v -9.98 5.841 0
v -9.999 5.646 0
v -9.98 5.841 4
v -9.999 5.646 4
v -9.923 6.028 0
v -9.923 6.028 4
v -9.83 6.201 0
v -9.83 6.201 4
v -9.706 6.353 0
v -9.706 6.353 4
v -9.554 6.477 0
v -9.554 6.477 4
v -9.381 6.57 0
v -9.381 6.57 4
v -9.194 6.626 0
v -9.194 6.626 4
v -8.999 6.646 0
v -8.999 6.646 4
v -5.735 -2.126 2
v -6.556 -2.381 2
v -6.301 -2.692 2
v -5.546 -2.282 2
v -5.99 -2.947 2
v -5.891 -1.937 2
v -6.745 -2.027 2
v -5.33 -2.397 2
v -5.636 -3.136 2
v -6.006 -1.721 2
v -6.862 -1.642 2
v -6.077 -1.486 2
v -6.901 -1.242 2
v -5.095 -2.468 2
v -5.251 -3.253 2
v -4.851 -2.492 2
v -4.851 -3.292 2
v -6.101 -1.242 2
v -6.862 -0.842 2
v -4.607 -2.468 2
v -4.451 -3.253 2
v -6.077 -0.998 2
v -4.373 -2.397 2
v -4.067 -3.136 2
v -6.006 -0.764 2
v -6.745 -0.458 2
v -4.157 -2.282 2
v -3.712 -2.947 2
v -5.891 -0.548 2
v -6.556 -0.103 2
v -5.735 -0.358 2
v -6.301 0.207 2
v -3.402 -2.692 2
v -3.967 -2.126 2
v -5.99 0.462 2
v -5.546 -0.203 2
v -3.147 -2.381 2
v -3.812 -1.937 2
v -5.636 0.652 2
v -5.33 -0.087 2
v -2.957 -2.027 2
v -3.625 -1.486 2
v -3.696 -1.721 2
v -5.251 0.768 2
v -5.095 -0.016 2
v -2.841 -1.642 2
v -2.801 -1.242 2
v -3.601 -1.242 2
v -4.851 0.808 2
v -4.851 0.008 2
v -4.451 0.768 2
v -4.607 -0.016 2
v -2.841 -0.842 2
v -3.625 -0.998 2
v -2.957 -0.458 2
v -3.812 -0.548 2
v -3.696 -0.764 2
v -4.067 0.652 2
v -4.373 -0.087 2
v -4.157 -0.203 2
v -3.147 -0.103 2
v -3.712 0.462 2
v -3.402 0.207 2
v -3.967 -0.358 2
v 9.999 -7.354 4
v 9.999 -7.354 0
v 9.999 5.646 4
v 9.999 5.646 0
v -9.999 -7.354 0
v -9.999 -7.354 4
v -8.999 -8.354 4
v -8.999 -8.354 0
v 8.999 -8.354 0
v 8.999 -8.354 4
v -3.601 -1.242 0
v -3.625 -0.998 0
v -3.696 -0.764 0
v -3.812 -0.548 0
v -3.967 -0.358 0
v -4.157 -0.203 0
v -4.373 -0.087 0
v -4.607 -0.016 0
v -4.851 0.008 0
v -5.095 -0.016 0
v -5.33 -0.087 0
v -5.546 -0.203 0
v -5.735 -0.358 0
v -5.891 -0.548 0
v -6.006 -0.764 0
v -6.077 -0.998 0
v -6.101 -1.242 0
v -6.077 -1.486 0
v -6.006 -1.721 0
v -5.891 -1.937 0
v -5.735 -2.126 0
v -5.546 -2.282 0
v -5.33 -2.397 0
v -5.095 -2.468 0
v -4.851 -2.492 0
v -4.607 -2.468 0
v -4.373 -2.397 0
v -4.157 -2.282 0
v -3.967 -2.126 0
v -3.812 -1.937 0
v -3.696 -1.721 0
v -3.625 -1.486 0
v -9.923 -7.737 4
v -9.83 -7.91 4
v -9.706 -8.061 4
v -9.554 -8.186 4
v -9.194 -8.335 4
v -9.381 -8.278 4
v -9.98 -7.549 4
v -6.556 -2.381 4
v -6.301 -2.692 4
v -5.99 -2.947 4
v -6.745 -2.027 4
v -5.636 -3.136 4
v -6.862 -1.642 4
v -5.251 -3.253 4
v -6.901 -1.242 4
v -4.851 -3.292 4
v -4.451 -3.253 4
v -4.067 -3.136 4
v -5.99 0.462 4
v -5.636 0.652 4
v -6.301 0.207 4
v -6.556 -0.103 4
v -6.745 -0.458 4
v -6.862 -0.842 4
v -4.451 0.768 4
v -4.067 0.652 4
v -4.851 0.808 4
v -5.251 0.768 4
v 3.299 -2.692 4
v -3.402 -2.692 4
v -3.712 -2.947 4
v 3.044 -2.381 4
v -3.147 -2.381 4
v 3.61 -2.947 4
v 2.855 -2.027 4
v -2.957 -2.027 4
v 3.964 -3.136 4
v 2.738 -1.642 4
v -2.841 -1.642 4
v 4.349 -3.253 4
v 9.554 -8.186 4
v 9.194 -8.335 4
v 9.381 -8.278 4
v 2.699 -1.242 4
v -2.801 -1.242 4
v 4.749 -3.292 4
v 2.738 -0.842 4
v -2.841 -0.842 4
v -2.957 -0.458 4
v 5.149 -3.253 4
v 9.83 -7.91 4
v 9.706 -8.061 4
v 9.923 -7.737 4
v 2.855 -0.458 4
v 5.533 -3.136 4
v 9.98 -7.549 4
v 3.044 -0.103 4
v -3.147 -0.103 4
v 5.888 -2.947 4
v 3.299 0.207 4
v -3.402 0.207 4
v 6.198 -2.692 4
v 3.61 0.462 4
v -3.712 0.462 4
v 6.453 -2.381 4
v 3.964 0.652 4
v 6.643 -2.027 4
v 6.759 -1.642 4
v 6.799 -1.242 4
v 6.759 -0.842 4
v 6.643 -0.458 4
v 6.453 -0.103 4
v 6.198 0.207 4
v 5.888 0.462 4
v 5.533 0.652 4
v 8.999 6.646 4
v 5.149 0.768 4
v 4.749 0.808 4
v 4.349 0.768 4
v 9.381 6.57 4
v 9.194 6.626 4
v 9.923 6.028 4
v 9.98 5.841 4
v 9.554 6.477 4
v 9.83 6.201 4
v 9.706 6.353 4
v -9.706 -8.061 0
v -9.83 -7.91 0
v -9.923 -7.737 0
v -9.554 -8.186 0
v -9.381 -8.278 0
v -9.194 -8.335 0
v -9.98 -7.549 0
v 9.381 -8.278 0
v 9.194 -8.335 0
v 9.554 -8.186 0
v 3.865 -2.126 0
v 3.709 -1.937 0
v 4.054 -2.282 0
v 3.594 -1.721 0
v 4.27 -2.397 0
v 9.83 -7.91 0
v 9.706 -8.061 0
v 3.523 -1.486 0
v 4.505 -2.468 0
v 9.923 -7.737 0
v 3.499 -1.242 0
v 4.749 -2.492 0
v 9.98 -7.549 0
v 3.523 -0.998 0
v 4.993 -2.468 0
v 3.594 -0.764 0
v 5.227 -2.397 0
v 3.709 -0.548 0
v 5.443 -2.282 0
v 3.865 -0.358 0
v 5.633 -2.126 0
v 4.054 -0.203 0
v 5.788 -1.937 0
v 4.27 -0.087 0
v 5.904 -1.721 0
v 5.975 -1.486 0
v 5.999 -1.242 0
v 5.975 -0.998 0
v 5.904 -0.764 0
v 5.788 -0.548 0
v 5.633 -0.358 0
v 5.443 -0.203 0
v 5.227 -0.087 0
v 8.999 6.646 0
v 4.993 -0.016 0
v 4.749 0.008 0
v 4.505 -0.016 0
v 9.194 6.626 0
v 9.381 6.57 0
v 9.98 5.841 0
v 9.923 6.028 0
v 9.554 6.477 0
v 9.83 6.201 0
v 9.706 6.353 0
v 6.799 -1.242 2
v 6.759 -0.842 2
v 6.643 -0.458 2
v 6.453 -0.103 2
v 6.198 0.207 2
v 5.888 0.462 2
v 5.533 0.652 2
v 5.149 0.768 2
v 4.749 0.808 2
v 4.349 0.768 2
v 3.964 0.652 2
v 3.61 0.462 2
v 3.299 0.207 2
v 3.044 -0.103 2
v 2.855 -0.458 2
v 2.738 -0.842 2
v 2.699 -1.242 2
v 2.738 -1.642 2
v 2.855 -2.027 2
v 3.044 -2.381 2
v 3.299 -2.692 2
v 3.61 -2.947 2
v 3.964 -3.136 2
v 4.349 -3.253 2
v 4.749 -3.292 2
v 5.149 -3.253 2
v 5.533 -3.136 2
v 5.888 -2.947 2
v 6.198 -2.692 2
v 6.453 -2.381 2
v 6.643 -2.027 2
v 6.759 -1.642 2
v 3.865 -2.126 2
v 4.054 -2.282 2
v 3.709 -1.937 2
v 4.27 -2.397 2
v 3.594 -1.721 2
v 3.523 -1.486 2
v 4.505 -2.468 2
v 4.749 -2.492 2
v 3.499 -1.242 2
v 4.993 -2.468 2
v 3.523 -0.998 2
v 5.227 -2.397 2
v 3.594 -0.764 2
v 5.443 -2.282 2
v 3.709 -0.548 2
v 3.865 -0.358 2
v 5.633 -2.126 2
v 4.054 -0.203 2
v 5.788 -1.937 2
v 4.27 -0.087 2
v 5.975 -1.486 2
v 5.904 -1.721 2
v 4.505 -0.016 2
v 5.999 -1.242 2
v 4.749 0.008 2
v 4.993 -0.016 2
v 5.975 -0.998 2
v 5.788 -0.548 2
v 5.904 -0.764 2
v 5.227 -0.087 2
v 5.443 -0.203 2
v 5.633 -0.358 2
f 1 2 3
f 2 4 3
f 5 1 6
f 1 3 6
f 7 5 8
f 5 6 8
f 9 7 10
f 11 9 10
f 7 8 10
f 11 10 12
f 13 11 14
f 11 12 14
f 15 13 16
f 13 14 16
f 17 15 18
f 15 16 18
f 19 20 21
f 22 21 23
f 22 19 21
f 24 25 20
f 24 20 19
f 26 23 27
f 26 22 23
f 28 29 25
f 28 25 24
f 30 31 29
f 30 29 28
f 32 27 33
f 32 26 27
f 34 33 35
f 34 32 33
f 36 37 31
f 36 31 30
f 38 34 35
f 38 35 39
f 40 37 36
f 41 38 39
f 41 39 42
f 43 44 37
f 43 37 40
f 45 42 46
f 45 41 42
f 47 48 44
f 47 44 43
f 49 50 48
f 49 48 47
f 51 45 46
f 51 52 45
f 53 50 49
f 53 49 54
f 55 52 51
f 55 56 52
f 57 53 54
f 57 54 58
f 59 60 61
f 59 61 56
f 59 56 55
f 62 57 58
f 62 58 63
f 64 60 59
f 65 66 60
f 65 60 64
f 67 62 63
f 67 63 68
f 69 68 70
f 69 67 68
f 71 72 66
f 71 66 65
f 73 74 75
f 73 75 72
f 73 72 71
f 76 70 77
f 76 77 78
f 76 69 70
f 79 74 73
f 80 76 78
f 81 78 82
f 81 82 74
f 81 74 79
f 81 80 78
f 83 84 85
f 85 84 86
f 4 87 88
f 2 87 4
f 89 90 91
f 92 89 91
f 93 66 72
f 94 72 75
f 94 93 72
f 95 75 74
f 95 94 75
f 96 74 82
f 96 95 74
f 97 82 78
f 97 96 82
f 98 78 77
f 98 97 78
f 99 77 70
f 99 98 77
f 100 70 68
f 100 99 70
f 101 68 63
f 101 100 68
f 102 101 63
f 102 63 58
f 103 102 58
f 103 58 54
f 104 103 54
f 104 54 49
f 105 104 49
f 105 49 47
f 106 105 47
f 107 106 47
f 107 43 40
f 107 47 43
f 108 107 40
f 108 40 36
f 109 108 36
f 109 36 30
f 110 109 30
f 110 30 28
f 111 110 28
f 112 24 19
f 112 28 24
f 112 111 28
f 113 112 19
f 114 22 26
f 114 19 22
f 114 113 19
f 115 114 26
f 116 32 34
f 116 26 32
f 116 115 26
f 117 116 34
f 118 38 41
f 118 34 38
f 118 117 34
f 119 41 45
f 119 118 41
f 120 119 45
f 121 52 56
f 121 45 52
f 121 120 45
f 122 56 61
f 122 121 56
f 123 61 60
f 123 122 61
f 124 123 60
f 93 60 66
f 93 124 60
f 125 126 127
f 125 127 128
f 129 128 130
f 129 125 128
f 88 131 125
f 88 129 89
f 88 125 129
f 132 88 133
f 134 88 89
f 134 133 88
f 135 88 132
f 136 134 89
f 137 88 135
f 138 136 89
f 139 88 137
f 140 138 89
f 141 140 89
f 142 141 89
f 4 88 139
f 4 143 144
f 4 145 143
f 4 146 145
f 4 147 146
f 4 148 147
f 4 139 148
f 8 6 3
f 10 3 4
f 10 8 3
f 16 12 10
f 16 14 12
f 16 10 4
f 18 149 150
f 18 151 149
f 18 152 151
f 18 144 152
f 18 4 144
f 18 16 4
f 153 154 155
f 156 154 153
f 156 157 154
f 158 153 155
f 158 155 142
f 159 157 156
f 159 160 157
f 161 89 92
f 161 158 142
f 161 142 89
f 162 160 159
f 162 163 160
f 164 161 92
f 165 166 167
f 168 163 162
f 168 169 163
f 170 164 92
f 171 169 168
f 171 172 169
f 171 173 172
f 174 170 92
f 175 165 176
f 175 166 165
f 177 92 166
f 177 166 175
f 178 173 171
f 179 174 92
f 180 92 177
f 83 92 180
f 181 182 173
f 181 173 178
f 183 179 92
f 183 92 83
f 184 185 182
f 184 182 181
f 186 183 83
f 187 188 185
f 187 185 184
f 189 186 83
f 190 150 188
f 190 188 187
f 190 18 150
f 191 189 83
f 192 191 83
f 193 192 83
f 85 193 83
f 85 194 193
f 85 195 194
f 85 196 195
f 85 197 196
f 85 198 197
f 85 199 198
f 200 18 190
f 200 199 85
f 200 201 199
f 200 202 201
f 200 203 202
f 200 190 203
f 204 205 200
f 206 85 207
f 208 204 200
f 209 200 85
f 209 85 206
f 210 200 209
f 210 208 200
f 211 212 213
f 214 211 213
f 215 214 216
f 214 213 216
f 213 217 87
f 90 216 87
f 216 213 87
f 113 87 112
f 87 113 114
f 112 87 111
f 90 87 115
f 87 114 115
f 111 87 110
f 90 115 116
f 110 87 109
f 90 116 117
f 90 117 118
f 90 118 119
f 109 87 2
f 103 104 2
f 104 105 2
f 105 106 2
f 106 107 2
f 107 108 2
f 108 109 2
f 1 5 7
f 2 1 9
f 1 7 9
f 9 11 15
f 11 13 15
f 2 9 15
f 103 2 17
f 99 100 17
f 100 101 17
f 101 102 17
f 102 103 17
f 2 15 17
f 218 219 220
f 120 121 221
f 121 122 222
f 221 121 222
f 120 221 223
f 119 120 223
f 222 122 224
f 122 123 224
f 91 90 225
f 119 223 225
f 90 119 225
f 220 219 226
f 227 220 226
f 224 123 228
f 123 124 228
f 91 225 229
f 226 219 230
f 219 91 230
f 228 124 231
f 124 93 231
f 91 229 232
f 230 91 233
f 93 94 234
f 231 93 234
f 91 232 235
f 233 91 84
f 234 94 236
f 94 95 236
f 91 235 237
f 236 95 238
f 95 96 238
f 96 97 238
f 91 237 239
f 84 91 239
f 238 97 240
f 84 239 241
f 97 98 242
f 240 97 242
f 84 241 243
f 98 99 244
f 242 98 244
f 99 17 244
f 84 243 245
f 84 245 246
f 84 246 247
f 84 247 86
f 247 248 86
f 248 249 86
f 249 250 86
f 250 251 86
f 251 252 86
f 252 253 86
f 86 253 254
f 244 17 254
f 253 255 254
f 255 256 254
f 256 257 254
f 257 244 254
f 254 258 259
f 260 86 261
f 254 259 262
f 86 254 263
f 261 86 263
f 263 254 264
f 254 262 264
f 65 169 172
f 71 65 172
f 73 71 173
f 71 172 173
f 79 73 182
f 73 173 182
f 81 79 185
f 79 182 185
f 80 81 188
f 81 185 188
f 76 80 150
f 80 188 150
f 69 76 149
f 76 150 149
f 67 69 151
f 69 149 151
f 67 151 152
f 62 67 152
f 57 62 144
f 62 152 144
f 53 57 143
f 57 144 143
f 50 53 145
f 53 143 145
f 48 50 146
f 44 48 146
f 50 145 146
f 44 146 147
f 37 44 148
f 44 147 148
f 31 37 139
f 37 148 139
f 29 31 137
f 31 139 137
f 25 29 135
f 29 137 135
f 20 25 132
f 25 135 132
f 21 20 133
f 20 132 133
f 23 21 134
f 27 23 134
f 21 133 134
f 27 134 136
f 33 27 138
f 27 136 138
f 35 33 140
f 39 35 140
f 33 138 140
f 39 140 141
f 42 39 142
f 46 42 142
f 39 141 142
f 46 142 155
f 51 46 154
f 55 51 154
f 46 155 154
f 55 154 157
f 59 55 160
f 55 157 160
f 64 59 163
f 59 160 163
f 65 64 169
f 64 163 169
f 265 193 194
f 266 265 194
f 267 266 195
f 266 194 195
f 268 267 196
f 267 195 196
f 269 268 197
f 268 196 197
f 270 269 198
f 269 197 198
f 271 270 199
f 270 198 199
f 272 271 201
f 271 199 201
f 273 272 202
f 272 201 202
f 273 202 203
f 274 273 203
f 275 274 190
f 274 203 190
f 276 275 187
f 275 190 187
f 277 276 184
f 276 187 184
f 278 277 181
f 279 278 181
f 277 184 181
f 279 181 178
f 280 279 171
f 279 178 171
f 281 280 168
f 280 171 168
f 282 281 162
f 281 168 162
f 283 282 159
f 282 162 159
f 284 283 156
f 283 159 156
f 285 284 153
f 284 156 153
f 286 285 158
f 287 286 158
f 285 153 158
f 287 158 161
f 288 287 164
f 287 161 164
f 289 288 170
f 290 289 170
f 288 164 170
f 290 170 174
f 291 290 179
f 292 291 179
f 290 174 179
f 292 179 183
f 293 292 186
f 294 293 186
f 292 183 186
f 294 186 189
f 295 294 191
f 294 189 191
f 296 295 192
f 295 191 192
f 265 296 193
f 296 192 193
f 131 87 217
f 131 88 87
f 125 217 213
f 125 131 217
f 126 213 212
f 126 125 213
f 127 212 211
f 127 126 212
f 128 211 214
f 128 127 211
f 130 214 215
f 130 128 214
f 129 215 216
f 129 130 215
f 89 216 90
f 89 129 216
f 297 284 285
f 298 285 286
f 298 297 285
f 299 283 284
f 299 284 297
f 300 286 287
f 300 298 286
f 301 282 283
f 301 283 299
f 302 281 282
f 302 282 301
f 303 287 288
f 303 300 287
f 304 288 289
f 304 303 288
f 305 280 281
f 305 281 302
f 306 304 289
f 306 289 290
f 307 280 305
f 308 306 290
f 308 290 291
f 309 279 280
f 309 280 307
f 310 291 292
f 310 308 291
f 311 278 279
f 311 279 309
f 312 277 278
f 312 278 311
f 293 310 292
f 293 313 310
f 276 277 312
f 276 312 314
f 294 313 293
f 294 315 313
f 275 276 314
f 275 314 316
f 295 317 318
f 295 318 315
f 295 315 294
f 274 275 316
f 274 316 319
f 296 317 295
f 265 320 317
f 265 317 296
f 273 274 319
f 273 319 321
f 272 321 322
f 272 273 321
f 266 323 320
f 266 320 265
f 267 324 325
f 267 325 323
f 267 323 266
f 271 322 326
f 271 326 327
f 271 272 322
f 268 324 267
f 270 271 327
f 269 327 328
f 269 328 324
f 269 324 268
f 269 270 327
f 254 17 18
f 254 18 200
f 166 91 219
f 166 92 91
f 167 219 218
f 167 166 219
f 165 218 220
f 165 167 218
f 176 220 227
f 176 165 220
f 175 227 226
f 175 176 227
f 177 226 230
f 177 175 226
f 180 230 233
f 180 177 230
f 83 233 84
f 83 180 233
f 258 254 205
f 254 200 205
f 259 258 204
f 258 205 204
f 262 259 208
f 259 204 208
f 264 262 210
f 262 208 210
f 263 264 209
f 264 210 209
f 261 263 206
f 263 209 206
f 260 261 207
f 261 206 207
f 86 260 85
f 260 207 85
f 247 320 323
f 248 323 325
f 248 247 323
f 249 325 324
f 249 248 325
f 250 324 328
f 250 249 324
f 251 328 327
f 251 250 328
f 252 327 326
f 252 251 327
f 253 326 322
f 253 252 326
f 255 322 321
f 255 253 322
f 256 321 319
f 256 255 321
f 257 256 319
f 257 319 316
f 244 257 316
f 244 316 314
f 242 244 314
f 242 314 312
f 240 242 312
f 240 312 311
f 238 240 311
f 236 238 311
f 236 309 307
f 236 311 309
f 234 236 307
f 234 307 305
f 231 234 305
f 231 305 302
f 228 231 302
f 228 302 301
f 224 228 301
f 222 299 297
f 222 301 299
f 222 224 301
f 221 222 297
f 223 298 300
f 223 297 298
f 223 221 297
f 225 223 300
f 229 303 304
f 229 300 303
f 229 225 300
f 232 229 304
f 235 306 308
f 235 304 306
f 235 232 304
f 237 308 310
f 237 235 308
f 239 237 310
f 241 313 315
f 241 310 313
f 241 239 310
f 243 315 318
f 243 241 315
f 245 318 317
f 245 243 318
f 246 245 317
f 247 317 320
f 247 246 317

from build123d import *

# Parameters (mm, degrees)
SKETCH1_W           = 19.997483178
SKETCH1_H           = 15
SKETCH1_R           = 1.25
BOSS_EXTRUDE1_DEPTH = 4
SKETCH2_R           = 2.05
CUT_EXTRUDE1_DEPTH  = 2
FILLET1_R           = 1


with BuildPart() as part:
    # Sketch1 → Boss-Extrude1 (new body)
    with BuildSketch(Plane.XY):
        with Locations((0, -0.854350343)):
            Rectangle(SKETCH1_W, SKETCH1_H)
        with Locations((-4.851258411, -1.24229421)):
            Circle(SKETCH1_R, mode=Mode.SUBTRACT)
        with Locations((4.748741589, -1.24229421)):
            Circle(SKETCH1_R, mode=Mode.SUBTRACT)
    extrude(amount=BOSS_EXTRUDE1_DEPTH)

    # Sketch2 → Cut-Extrude1 (cut)
    with BuildSketch(Plane.XY.offset(4)):
        with Locations((-4.851258411, -1.24229421)):
            Circle(SKETCH2_R)
        with Locations((4.748741589, -1.24229421)):
            Circle(SKETCH2_R)
    extrude(amount=-CUT_EXTRUDE1_DEPTH, mode=Mode.SUBTRACT)

    # Fillet1
    fillet1_edges = [part.edges().sort_by_distance(p)[0] for p in [
        (9.998741589, -8.354350343, 2),
        (-9.998741589, -8.354350343, 2),
        (-9.998741589, 6.645649657, 2),
        (9.998741589, 6.645649657, 2),
    ]]
    fillet(fillet1_edges, radius=FILLET1_R)


solid = part.part
